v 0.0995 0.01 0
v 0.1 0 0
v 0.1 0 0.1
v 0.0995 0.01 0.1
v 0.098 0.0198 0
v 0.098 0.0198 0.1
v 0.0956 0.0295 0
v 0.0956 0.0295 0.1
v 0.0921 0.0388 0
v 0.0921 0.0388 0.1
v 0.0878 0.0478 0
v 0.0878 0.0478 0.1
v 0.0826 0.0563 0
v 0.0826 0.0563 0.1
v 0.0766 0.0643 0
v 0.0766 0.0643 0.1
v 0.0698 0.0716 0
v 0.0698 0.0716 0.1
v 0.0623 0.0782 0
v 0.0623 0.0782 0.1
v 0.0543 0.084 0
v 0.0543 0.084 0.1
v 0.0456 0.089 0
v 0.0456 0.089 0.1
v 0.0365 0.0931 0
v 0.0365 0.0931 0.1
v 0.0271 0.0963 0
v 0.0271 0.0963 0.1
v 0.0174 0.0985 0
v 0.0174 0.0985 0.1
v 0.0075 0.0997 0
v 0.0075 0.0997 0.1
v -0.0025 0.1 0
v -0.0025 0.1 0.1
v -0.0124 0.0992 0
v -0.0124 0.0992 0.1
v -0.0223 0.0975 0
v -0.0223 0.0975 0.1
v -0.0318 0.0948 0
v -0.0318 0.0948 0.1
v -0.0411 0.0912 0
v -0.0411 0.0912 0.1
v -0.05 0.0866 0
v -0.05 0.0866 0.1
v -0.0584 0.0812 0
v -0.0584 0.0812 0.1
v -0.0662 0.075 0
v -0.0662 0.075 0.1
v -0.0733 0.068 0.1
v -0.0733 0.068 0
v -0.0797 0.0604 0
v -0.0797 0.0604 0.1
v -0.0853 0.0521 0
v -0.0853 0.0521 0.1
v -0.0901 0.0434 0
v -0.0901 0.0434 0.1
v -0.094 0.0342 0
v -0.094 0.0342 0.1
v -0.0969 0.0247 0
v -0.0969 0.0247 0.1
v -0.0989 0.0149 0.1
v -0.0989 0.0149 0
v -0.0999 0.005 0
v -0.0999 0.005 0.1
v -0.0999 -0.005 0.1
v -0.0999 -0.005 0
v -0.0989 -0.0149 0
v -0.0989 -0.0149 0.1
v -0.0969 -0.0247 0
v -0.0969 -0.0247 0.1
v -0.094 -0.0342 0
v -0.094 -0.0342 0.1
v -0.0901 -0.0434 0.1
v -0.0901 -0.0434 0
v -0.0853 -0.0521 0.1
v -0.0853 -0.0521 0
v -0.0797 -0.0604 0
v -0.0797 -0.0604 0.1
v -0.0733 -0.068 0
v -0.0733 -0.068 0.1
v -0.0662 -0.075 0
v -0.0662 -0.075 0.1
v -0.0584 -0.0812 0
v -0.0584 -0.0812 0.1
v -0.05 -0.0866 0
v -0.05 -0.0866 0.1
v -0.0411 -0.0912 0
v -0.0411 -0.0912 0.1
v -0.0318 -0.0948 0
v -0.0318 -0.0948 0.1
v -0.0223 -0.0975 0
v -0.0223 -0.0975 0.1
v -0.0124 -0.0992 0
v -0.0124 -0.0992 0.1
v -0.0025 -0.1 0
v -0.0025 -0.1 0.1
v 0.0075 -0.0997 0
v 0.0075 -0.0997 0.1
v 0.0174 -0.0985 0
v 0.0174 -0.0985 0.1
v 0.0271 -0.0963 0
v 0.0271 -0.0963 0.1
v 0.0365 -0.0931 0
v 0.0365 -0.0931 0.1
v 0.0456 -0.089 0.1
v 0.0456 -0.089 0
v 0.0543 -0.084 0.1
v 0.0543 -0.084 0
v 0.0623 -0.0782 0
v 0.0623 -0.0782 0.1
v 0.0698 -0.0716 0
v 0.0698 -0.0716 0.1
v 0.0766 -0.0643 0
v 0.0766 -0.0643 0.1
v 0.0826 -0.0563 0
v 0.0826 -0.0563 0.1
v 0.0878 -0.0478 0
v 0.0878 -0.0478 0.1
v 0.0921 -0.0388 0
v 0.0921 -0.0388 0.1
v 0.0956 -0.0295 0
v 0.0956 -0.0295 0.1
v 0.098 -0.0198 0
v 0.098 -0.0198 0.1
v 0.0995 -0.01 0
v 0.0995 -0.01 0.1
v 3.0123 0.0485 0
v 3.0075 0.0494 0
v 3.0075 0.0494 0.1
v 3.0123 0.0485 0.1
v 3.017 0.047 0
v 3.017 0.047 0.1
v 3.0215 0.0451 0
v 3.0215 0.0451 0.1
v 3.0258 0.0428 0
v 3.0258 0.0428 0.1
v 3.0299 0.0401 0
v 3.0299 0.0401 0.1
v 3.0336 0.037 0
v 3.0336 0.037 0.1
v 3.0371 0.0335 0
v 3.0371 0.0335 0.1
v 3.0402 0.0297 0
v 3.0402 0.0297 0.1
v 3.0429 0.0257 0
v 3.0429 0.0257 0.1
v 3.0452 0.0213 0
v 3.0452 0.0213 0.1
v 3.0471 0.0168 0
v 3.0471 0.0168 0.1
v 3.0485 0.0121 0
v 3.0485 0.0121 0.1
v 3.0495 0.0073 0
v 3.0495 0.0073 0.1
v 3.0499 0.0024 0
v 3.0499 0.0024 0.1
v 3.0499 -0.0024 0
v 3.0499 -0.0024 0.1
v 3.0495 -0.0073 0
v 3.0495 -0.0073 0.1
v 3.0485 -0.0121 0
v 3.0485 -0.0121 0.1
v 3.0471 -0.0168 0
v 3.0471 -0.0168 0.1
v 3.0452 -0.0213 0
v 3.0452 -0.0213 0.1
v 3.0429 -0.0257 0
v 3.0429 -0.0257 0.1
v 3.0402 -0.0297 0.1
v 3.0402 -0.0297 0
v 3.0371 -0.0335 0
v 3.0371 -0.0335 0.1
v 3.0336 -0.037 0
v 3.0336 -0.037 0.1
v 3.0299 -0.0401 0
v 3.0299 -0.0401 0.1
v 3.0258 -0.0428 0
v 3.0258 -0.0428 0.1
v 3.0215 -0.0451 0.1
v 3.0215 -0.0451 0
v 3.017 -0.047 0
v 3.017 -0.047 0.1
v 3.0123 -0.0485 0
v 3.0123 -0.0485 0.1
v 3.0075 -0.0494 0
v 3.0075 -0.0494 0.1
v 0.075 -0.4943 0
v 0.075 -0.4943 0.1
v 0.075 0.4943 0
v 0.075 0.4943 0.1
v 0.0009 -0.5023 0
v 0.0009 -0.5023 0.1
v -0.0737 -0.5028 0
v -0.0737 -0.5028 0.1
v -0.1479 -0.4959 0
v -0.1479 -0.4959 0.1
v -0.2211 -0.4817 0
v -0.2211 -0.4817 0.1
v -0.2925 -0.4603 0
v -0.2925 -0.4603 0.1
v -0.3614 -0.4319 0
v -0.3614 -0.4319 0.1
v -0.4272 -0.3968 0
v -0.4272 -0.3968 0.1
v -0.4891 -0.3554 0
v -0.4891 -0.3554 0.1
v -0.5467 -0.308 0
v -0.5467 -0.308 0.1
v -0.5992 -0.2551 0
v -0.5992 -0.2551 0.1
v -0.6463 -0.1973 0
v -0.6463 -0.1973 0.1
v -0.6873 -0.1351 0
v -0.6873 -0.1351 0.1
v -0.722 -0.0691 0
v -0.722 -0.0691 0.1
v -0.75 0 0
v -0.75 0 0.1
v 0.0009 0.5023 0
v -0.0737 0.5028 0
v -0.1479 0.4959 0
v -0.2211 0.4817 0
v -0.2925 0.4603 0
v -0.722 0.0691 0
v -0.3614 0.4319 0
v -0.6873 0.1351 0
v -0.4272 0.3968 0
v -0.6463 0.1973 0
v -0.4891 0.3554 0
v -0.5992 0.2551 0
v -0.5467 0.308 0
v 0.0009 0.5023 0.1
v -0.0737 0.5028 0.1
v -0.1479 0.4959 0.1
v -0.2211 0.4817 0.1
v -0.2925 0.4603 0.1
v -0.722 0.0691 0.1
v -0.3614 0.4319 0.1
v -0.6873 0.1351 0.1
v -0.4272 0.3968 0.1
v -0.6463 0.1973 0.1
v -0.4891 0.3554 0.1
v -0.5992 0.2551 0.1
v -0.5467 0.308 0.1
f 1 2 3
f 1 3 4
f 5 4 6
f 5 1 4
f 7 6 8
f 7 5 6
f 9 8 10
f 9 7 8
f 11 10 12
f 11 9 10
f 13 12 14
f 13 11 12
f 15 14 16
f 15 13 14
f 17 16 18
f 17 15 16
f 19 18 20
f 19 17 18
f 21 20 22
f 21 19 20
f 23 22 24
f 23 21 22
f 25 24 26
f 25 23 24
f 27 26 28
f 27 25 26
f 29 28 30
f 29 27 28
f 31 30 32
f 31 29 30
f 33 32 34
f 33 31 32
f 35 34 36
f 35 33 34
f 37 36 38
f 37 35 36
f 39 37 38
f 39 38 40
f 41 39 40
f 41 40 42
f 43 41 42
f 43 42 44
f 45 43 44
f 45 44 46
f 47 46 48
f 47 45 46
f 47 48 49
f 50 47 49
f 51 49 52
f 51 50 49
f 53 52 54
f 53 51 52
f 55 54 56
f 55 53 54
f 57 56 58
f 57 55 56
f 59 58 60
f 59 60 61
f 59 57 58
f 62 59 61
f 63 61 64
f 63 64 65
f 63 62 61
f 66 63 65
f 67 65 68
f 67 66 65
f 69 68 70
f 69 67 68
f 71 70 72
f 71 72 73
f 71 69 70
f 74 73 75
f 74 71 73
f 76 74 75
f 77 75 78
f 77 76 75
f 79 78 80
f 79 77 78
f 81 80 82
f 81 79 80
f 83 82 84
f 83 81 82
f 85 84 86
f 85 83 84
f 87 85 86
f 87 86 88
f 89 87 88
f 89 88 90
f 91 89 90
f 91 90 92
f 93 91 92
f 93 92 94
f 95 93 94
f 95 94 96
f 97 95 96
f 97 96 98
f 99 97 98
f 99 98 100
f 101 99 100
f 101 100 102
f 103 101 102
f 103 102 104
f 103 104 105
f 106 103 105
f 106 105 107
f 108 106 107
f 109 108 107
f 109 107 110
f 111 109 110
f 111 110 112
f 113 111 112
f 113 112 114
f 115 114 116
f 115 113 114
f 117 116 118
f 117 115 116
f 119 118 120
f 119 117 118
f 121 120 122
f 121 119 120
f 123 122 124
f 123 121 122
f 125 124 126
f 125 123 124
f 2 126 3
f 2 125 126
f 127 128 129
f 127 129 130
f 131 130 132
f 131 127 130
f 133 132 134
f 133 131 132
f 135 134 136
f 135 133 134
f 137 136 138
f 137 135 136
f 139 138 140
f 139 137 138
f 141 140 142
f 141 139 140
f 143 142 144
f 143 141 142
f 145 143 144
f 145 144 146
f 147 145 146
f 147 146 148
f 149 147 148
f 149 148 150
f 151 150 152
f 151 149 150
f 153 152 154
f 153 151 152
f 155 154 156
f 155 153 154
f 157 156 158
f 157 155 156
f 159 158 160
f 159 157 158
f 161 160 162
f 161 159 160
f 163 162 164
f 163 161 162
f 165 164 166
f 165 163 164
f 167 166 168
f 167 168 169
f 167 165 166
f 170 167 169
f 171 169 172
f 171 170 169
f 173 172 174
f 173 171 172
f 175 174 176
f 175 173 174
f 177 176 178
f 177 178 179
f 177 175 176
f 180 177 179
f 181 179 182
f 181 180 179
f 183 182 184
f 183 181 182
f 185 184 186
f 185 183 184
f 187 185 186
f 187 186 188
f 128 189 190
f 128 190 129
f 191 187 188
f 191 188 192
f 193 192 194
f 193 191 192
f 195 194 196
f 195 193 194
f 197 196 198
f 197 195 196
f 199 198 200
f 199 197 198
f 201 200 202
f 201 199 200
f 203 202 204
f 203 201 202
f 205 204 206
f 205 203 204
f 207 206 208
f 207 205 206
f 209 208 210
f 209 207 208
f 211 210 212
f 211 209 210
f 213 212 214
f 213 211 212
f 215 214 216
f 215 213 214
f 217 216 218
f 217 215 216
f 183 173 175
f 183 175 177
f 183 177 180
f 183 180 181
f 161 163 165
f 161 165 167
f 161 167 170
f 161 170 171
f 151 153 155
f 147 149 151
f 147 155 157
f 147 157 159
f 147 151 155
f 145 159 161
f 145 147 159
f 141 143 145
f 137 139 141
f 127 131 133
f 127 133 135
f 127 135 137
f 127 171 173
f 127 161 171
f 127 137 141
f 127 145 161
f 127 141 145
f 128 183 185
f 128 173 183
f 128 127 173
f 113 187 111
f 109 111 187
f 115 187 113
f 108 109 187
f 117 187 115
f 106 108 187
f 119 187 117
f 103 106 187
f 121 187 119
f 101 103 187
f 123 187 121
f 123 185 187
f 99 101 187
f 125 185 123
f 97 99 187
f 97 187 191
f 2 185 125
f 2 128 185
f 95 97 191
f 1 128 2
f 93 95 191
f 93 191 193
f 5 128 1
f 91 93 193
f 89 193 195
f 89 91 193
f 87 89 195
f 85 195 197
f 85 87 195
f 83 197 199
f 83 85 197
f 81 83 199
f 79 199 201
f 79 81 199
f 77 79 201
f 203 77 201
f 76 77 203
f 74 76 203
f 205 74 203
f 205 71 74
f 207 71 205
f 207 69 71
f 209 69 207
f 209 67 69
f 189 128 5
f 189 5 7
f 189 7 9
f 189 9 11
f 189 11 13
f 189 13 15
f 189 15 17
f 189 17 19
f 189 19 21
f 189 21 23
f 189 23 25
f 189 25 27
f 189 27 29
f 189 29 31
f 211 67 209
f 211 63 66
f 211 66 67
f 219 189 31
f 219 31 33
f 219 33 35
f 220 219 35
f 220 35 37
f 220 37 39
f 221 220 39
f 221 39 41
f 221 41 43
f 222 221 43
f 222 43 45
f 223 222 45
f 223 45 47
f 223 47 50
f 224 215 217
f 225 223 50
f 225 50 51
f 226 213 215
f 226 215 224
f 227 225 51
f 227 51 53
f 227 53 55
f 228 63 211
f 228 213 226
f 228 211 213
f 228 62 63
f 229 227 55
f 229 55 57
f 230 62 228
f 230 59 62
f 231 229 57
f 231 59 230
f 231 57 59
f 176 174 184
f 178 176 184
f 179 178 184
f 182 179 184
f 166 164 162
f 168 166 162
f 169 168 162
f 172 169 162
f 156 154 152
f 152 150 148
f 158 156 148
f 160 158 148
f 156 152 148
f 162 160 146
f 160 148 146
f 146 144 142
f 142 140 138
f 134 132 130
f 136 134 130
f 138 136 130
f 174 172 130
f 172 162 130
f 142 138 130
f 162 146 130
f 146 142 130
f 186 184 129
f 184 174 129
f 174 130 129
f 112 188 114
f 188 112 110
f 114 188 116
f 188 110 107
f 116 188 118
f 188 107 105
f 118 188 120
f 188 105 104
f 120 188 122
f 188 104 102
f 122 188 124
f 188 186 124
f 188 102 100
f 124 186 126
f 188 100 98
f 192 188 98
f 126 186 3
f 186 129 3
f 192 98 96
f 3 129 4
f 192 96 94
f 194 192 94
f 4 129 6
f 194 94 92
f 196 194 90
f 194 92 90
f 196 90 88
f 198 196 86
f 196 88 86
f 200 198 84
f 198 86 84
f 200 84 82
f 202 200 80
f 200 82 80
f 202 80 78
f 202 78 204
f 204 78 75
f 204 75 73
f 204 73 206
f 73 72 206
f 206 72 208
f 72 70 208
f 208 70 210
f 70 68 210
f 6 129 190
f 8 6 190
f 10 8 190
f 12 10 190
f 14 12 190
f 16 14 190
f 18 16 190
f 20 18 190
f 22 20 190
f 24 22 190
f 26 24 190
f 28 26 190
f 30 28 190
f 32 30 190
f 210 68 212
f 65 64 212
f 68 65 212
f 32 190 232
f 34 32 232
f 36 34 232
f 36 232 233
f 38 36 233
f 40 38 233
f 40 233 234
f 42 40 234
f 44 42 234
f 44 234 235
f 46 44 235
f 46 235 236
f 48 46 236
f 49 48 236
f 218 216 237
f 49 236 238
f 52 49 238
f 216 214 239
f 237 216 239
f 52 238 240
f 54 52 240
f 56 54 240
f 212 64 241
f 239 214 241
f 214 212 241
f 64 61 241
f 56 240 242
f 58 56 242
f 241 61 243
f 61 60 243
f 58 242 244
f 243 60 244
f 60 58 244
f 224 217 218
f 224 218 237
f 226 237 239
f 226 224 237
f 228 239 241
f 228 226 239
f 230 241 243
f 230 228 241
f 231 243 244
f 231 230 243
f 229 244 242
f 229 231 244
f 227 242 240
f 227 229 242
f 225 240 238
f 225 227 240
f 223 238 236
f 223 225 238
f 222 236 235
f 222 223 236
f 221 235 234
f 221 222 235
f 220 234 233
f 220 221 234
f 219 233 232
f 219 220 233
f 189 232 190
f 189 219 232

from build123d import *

# Parameters (mm, degrees)
SKETCH1_R          = 0.1
BASE_EXTRUDE_DEPTH = 0.1


with BuildPart() as part:
    # Sketch1 → Base-Extrude (new body)
    with BuildSketch(Plane.XY):
        with BuildLine():
            Line((0.075, 0.494342998), (3.0075, 0.0494343))
            ThreePointArc((3.0075, 0.0494343), (3.05, 0), (3.0075, -0.0494343))
            Line((3.0075, -0.0494343), (0.075, -0.494342998))
            ThreePointArc((0.075, -0.494342998), (-0.427169628, -0.396819504), (-0.75, 0))
            ThreePointArc((-0.75, 0), (-0.427169628, 0.396819504), (0.075, 0.494342998))
        make_face()
        Circle(SKETCH1_R, mode=Mode.SUBTRACT)
    extrude(amount=BASE_EXTRUDE_DEPTH)


solid = part.part
